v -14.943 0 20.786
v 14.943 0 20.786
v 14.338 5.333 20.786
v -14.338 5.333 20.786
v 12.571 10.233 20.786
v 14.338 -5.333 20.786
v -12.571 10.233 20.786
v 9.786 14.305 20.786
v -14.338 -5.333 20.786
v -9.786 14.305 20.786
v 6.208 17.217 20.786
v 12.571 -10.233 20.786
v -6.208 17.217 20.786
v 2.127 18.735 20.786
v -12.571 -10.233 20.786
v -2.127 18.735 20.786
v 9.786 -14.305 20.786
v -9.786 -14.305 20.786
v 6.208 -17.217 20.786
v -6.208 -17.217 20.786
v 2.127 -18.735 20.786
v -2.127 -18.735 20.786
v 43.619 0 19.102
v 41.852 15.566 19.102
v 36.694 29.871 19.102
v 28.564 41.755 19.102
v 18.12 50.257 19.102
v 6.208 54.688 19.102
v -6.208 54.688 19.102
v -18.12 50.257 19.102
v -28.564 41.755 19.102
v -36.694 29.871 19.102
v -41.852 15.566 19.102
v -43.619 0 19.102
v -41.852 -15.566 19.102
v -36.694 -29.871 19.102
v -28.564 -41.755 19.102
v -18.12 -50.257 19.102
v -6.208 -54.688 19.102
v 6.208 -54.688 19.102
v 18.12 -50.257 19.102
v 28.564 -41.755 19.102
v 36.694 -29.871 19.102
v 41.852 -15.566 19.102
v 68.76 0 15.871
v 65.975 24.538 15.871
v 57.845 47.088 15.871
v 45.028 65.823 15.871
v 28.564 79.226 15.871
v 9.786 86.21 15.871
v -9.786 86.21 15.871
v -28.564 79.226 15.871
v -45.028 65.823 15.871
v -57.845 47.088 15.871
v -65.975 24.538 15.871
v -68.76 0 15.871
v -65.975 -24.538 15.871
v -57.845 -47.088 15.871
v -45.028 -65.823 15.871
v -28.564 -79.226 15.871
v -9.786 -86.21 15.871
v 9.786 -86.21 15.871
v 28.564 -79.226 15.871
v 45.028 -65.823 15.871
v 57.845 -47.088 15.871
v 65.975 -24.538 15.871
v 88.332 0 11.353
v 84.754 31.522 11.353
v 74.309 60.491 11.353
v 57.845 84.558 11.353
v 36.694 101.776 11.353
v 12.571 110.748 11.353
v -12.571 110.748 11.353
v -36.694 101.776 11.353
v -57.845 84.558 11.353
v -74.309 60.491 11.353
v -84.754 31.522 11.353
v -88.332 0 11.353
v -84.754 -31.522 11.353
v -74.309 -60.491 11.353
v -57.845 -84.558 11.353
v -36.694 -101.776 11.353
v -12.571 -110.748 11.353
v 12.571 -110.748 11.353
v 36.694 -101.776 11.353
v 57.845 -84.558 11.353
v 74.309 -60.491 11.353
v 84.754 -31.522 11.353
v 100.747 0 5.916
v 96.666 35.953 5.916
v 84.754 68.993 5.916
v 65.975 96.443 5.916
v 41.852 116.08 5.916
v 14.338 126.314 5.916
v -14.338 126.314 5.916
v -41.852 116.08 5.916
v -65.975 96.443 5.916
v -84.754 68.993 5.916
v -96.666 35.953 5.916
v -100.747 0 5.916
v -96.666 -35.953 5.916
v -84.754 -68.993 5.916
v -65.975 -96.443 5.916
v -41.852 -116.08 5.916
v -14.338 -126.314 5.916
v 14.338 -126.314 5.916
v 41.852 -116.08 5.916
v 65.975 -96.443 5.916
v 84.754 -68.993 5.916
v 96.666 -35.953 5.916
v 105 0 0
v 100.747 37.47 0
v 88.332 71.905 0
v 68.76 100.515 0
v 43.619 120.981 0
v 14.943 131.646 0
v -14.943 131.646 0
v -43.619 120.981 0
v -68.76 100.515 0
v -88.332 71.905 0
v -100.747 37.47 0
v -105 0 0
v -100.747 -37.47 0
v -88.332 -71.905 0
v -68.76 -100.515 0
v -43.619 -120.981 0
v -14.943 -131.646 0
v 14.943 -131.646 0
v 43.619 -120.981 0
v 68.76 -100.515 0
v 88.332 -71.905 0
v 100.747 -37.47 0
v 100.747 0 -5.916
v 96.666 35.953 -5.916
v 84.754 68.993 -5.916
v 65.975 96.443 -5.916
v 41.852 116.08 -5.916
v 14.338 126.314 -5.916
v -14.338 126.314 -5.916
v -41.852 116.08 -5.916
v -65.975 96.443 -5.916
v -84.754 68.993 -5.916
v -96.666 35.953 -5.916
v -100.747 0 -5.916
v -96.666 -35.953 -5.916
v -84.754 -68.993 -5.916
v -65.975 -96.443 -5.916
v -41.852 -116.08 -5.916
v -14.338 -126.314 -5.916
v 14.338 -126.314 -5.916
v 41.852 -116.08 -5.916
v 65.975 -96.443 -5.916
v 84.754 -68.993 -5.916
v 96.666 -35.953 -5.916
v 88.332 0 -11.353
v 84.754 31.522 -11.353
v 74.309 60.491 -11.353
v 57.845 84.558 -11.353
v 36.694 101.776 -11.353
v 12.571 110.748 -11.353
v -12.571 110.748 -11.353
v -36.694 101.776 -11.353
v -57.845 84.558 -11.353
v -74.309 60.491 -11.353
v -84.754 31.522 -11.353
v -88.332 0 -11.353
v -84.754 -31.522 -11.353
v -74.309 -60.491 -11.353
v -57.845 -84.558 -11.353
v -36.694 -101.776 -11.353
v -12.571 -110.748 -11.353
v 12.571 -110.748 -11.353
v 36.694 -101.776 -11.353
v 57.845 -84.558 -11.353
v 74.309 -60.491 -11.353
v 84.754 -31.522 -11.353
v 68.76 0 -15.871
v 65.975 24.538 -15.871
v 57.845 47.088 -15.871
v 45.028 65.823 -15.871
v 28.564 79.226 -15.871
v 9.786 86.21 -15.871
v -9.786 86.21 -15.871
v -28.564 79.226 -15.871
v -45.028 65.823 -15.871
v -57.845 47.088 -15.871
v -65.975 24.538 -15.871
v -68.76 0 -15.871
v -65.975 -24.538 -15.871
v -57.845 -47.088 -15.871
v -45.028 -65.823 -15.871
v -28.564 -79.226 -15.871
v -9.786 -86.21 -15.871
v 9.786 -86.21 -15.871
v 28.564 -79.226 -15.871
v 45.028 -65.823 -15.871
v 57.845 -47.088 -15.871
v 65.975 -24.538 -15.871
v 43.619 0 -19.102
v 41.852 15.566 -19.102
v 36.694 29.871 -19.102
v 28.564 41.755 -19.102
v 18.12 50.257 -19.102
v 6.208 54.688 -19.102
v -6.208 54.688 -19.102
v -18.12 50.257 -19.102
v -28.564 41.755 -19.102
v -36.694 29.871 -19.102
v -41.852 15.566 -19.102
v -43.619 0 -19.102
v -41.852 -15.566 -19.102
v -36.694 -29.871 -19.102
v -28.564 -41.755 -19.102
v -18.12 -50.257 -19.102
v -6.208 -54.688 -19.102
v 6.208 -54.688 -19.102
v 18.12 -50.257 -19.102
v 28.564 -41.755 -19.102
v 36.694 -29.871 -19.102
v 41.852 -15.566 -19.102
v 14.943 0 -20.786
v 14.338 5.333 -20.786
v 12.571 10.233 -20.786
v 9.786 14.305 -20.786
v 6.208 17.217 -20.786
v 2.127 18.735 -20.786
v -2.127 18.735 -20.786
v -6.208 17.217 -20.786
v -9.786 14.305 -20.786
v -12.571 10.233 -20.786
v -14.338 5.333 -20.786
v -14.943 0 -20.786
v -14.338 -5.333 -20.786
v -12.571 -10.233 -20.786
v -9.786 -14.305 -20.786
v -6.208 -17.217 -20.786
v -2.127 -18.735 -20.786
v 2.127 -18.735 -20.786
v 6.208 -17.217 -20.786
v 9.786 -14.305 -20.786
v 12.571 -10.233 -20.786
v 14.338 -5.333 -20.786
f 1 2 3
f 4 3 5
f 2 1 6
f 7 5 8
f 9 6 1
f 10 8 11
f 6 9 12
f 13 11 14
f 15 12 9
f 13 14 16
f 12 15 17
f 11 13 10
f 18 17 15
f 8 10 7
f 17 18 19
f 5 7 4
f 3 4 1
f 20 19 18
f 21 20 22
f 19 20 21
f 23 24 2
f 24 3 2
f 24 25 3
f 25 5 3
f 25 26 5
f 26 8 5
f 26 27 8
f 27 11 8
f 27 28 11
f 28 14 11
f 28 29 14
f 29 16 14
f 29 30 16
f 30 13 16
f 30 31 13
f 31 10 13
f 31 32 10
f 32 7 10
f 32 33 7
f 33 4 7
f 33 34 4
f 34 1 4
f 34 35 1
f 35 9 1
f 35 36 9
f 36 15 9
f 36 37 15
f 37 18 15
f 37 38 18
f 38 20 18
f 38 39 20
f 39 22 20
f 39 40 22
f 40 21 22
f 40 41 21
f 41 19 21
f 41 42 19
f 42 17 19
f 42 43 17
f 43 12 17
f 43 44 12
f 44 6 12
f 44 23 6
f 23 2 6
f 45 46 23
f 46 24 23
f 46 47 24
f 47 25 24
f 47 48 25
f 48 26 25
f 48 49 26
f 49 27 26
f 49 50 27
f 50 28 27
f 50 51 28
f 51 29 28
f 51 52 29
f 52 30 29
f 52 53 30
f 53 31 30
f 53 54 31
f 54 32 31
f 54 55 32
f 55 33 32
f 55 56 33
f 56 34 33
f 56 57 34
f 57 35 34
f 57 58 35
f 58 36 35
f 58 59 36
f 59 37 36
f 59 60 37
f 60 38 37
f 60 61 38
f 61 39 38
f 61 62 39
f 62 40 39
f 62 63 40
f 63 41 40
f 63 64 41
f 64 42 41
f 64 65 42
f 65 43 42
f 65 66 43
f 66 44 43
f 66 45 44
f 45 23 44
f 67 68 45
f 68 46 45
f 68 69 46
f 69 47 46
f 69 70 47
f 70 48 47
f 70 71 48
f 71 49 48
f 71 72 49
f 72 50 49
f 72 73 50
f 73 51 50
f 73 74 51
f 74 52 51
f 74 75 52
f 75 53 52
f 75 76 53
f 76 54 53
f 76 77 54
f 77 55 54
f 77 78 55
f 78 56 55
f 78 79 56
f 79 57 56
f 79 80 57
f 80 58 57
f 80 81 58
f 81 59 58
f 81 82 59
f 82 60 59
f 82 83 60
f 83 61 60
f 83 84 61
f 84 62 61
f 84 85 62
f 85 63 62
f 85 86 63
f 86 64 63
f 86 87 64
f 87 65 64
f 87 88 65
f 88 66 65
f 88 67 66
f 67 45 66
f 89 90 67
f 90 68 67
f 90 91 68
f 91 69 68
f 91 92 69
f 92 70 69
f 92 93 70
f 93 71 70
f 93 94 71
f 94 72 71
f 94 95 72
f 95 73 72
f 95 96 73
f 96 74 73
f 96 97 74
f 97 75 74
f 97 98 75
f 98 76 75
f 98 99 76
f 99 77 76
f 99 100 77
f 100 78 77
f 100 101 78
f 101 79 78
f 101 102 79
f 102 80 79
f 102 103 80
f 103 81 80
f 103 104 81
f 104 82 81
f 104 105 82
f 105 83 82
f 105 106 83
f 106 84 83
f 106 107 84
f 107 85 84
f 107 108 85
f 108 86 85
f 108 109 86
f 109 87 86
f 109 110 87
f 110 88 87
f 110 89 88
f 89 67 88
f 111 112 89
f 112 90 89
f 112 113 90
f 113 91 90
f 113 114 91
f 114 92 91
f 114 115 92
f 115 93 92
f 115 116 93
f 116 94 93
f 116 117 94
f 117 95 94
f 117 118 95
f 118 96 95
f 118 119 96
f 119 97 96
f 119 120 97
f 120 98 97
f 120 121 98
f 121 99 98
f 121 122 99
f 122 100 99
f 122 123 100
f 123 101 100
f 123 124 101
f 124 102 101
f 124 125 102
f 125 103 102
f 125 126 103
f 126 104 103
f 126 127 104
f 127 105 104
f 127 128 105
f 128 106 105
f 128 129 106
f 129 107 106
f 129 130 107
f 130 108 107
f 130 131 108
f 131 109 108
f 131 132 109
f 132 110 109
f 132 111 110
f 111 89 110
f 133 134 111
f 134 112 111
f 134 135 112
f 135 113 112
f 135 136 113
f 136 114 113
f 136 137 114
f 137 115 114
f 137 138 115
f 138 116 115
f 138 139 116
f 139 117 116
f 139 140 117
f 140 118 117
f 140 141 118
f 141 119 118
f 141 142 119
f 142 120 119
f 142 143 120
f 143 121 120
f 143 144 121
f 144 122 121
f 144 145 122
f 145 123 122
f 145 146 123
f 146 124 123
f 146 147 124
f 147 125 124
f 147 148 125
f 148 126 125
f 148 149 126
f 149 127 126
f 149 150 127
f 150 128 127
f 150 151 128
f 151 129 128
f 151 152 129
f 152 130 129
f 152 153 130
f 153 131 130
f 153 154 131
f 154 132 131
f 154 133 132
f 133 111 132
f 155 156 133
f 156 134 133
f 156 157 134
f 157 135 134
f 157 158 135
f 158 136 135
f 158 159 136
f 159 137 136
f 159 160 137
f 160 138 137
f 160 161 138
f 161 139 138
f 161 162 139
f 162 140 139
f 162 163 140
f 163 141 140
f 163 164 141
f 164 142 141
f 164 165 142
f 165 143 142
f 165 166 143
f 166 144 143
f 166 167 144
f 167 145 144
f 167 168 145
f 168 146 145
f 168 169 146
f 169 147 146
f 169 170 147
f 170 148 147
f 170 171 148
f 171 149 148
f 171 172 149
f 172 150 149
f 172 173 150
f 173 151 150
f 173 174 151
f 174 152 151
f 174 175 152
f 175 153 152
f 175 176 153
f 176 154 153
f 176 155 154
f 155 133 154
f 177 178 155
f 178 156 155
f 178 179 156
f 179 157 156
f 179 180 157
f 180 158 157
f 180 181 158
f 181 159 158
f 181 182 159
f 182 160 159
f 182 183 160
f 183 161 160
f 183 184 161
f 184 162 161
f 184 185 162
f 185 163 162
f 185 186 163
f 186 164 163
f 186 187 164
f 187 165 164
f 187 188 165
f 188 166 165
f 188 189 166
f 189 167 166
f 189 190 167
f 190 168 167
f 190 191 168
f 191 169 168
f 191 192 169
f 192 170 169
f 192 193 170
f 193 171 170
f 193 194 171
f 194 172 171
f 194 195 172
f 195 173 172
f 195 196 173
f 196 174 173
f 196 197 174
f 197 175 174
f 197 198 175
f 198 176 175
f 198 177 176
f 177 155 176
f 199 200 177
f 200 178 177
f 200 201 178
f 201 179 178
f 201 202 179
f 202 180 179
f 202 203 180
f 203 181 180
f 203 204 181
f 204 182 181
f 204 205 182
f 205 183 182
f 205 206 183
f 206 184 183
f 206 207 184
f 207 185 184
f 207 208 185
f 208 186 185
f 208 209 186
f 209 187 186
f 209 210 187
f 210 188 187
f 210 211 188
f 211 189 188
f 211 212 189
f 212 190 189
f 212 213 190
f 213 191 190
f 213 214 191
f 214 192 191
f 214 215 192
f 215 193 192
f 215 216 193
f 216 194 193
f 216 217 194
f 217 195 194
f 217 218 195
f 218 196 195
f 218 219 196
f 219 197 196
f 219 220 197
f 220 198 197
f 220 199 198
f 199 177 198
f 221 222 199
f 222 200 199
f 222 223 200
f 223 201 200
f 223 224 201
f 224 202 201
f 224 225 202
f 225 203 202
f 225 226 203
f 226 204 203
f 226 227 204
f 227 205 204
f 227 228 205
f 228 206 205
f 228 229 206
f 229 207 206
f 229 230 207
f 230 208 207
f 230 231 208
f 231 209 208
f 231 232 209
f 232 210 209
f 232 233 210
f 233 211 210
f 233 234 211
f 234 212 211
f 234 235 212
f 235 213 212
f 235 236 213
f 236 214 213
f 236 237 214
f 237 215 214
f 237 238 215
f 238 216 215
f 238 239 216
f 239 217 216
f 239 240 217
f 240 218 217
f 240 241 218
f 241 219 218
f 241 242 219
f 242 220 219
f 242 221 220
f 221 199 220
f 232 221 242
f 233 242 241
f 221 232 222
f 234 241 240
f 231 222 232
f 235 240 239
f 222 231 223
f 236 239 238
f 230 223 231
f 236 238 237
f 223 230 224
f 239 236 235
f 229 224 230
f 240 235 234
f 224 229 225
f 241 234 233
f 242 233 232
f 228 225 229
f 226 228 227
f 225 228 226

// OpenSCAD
// Generated by SolidPython 1.0.1 on 2020-07-29 00:46:52


scale(v = [15, 19, 3]) {
	sphere(r = 7);
}
/***********************************************
*********      SolidPython code:      **********
************************************************
 
# import packages: SolidPython
from solid import *
from solid.utils import *
from itertools import chain, combinations, permutations


class Resize:

    def __init__(self, scad_file):
        self.scad_file = scad_file
        #self.scad_file = import_scad(scad_file)
        # cone/cylinder param:
        self.r1 = 0
        self.r2 = 0
        self.h = 0
        # rectangular prism param:
        self.w = 0
        self.l = 0
        # ellipse param:
        self.r = 0

    # import OpenScad code (file name corresponds to shape)


    # classify shape + parameters
    def assign(self, param1, param2, param3):
        if self.scad_file == 'cone.scad':
            self.r1 = param1
            self.r2 = param2
            self.h = param3
        elif self.scad_file == 'cylinder.scad':
            self.r1 = param1
            self.r2 = param2
            self.h = param3
        elif self.scad_file == 'rectangularPrism.scad':
            self.h = param1
            self.l = param2
            self.w = param3
        else:
            self.r = param1
            self.h = param2

    # resize parameters
    def iterate(self):
        x = range(3, 20, 2)
        i = 1
        if self.scad_file == 'cone.scad':
            tempList = list(permutations(x, 2))
            for temp in tempList:
                param1 = temp[0]
                param2 = temp[1]
                filepath = 'produced_scad_files/' + 'cone' + str(param1) + '_' + str(param2) + '_' + '.scad'
                scad_render_to_file(cylinder(h=param1, r1=param2, r2=0), filepath)

        elif self.scad_file == 'cylinder.scad':
            tempList = list(permutations(x, 3))
            for temp in tempList:
                param1 = temp[0]
                param2 = temp[1]
                filepath = 'produced_scad_files/' + 'cylinder' + str(param1) + '_' + str(param2) + '_' + '.scad'
                scad_render_to_file(cylinder(h=param1, r1=param2, r2=param2), filepath)

        elif self.scad_file == 'rectangularPrism.scad':
            tempList = list(permutations(x, 3))
            for temp in tempList:
                param1 = temp[0]
                param2 = temp[1]
                param3 = temp[2]
                filepath = 'produced_scad_files/' + 'rectangularPrism' + str(param1) + '_' + str(param2) + '_' + str(
                    param3) + '.scad'
                scad_render_to_file(cube(size=(param1, param2, param3)), filepath)

        elif self.scad_file == 'ellipse.scad':
            tempList = list(permutations(x, 4))
            for temp in tempList:
                param1 = temp[0]
                param2 = temp[1]
                param3 = temp[2]
                param4 = temp[3]
                filepath = 'produced_scad_files/' + 'ellipse' + str(param1) + '_' + str(param2) + '_' + str(param3) + '_' + str(param4) + '.scad'
                scad_render_to_file(scale([param1, param2, param3])(sphere(r=param4)), filepath)

    def render_to_scadfile(self):
        scad_render_to_file(scad, 'example.scad') 
 
************************************************/
